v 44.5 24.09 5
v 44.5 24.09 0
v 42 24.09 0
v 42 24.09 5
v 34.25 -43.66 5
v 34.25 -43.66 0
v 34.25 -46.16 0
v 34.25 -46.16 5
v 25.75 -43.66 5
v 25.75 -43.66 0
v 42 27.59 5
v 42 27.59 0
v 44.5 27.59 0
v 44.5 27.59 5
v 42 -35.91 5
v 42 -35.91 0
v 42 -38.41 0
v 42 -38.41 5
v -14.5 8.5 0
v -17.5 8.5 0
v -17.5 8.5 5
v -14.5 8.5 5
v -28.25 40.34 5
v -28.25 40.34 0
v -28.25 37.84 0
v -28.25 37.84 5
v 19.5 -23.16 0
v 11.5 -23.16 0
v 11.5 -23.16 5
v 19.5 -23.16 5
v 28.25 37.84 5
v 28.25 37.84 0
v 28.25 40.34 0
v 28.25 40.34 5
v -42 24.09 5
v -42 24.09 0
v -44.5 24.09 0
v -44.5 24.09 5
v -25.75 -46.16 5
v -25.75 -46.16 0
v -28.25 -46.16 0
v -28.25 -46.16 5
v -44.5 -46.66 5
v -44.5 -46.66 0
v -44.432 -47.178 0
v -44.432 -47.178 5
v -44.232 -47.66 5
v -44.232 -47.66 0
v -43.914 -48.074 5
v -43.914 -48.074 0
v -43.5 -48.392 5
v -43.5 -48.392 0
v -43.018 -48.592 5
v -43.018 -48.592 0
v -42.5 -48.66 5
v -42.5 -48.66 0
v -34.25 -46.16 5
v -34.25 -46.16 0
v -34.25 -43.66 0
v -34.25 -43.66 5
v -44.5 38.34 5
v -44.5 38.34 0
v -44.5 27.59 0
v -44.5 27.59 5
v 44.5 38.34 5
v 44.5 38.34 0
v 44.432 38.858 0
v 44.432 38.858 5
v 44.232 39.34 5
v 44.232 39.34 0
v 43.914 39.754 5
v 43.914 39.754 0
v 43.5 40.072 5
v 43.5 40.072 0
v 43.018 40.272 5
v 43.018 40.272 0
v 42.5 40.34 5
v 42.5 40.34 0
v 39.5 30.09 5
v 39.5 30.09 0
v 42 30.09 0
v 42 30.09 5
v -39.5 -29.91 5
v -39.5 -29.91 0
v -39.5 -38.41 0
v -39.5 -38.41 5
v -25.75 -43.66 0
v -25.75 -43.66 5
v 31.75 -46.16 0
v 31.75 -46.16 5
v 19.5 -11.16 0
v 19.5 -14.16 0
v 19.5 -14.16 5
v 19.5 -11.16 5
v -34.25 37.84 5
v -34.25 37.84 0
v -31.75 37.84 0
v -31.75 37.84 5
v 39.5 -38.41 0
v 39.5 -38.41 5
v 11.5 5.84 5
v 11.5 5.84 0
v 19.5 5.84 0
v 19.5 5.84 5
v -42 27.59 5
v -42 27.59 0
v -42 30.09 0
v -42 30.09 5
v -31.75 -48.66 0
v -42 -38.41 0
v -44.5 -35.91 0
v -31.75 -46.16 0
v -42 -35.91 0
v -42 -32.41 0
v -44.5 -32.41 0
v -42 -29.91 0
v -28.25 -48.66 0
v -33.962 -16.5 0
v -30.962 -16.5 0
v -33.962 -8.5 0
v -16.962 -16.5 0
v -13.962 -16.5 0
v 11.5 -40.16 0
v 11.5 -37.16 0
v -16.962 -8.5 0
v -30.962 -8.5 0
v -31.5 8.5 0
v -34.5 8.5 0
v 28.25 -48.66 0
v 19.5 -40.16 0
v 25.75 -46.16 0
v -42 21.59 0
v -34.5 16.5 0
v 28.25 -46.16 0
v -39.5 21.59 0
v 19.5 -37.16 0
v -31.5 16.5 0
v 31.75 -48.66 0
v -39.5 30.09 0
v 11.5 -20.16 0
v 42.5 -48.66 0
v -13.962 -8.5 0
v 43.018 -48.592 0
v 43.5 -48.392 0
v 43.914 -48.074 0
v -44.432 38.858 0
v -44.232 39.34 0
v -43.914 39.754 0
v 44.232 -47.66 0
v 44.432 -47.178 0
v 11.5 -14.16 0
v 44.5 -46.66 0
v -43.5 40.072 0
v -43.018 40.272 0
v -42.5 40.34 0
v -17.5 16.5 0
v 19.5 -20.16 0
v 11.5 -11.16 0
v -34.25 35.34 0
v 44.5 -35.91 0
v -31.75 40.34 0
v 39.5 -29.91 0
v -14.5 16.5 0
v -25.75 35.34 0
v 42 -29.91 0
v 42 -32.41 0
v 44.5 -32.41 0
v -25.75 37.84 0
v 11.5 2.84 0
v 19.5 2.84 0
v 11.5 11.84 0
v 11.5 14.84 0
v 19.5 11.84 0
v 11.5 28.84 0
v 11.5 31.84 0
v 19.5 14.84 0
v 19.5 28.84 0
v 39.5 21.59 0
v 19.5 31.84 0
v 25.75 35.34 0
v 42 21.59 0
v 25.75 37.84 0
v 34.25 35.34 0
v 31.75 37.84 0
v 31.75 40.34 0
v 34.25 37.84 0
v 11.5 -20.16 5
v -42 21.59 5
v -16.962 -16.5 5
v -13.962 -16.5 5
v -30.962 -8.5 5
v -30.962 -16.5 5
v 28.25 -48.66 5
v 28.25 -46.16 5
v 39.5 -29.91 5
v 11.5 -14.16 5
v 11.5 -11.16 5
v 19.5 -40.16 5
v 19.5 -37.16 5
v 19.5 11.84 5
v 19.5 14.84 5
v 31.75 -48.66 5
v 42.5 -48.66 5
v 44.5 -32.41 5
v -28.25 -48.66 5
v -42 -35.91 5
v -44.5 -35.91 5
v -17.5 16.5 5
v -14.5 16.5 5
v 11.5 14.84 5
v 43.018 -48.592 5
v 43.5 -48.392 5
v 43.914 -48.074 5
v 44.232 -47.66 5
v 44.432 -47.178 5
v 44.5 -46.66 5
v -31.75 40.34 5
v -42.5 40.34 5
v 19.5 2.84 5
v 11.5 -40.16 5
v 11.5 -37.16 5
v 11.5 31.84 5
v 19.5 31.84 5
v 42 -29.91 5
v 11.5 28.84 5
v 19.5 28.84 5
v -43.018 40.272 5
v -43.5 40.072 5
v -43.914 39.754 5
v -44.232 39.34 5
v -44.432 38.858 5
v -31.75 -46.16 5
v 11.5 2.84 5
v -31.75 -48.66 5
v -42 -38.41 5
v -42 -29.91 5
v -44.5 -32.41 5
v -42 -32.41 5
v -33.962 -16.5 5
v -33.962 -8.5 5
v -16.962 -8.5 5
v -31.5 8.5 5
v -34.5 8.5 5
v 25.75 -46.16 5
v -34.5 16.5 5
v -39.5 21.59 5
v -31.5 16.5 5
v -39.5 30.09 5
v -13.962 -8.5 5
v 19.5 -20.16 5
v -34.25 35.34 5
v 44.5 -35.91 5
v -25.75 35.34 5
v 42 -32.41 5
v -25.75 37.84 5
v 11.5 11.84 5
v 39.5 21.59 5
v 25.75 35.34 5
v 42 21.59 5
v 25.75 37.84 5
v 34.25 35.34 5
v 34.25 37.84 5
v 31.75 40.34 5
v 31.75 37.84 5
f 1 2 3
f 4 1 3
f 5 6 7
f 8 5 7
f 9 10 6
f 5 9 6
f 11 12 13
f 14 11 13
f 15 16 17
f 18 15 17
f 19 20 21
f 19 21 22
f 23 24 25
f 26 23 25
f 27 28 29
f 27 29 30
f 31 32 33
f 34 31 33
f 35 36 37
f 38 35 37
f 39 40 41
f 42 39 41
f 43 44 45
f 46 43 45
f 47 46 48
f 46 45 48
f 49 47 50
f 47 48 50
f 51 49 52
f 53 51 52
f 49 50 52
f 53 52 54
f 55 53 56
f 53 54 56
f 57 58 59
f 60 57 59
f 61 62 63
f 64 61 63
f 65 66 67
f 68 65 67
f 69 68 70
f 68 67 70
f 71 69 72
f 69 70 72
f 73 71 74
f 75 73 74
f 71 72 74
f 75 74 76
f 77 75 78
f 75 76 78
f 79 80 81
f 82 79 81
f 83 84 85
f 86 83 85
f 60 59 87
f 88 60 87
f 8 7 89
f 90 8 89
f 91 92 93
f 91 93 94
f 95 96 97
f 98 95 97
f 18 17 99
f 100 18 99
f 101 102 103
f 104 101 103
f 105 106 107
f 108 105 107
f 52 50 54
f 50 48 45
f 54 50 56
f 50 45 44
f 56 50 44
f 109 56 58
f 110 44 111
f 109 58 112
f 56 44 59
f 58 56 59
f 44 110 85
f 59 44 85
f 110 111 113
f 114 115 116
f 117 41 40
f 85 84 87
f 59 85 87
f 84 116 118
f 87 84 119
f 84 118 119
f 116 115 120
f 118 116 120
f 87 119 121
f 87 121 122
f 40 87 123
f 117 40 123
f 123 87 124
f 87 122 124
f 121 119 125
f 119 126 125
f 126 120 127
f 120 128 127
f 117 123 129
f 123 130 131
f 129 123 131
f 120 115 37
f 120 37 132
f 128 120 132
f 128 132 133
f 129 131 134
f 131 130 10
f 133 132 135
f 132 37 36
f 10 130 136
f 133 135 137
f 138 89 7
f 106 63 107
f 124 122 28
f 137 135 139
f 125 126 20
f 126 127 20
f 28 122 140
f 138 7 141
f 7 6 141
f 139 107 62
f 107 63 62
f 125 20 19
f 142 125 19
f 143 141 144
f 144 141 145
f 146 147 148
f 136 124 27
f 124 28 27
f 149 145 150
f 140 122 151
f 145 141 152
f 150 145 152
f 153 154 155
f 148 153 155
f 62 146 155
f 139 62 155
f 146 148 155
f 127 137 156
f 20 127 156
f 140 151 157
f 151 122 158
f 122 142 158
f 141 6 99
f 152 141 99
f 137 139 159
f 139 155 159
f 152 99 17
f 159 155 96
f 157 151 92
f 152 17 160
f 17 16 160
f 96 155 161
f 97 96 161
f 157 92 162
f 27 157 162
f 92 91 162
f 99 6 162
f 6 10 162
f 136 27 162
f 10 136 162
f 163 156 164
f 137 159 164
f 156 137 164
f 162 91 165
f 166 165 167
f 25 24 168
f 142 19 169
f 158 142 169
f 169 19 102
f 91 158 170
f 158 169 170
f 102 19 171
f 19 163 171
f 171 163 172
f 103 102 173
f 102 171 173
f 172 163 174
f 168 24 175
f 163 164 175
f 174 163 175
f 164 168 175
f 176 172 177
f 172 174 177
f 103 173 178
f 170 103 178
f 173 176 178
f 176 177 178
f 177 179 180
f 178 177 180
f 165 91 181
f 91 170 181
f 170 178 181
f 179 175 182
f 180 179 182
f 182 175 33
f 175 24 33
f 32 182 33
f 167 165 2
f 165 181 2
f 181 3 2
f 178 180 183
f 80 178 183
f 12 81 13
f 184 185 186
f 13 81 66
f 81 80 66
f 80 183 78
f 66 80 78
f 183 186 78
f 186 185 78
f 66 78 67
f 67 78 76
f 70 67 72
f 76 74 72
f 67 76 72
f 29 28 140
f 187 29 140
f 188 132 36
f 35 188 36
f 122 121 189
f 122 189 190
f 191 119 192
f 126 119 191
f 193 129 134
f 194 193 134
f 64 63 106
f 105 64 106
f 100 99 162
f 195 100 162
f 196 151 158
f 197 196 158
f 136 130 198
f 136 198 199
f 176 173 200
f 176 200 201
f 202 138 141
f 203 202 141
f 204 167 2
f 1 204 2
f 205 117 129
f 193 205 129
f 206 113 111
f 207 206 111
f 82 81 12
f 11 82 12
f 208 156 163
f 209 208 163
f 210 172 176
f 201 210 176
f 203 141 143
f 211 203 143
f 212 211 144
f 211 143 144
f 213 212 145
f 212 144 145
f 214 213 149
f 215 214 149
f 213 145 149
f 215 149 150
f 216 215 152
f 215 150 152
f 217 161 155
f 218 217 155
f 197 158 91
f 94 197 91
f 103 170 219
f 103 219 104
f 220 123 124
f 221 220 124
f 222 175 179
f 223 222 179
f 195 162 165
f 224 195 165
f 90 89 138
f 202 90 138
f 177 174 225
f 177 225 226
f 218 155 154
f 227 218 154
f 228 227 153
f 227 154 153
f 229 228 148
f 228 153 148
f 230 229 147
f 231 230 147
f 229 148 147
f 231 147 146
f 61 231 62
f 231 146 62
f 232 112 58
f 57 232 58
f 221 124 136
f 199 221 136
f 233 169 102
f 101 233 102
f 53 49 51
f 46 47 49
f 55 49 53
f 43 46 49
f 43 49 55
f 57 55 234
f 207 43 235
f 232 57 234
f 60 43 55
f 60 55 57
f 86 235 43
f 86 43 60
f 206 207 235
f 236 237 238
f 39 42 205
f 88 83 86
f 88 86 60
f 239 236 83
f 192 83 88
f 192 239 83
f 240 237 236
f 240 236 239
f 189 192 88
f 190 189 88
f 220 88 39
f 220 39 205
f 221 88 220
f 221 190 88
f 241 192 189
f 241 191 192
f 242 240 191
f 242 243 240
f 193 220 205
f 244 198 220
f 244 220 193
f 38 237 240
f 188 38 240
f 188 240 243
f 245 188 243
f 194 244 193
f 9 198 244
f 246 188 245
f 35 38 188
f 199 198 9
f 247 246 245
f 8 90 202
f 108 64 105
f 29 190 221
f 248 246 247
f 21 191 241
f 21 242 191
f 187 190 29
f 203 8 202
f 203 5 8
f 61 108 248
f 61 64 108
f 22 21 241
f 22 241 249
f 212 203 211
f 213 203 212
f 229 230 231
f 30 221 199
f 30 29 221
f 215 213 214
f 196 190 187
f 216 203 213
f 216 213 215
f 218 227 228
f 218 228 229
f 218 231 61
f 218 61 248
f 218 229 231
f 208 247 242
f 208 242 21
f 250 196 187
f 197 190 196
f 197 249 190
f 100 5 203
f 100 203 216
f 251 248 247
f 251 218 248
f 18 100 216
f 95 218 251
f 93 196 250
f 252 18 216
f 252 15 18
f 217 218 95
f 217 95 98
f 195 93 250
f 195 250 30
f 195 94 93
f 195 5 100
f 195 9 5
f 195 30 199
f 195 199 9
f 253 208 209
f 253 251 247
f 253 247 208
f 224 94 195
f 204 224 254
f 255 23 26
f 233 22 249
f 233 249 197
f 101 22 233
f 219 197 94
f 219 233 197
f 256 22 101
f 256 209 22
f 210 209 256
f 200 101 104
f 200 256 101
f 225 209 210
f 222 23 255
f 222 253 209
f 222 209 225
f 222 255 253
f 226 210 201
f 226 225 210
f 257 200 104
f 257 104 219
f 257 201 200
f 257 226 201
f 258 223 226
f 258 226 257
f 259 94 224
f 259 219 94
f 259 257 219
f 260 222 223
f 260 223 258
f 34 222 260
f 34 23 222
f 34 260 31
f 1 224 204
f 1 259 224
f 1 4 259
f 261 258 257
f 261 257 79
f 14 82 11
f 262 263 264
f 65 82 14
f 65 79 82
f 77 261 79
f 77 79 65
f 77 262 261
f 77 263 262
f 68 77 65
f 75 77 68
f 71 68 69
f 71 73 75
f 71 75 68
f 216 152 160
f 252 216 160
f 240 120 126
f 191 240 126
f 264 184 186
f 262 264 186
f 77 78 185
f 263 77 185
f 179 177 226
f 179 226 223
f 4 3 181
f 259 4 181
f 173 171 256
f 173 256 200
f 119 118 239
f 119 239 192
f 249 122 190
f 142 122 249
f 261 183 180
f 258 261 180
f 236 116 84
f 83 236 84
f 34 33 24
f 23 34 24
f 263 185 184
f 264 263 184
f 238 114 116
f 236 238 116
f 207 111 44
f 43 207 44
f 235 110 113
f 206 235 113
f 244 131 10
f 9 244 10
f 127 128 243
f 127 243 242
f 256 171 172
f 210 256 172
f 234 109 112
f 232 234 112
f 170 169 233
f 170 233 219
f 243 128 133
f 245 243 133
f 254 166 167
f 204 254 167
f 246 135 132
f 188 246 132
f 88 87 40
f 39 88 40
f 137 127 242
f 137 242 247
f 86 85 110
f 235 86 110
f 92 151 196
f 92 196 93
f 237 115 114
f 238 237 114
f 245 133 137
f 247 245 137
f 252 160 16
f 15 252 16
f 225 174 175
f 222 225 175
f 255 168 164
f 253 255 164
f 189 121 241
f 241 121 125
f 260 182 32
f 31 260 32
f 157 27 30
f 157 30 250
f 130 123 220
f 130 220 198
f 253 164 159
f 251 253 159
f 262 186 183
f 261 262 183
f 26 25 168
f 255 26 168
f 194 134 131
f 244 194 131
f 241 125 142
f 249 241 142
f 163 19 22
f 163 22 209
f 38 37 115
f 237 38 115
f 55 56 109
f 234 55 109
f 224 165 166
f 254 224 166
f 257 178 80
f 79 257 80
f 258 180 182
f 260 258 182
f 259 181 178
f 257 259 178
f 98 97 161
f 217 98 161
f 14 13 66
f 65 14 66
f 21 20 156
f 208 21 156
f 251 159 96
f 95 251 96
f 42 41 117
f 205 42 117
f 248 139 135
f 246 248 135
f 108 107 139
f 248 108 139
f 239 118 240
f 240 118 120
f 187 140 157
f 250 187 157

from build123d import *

# Parameters (mm, degrees)
SKETCH_1_W      = 3
SKETCH_1_H      = 8
SKETCH_1_W_2    = 8
SKETCH_1_H_2    = 3
EXTRUDE_1_DEPTH = 5


with BuildPart() as part:
    # Эскиз1 → Бобышка-Вытянуть1 (new body)
    with BuildSketch(Plane.XY):
        with BuildLine():
            Line((-31.75, 40.340066927), (-42.5, 40.340066927))
            ThreePointArc((-42.5, 40.340066927), (-43.914213562, 39.754280489), (-44.5, 38.340066927))
            Line((-44.5, 38.340066927), (-44.5, 27.590066927))
            Line((-44.5, 27.590066927), (-42, 27.590066927))
            Line((-42, 27.590066927), (-42, 30.090066927))
            Line((-42, 30.090066927), (-39.5, 30.090066927))
            Line((-39.5, 30.090066927), (-39.5, 21.590066927))
            Line((-39.5, 21.590066927), (-42, 21.590066927))
            Line((-42, 21.590066927), (-42, 24.090066927))
            Line((-42, 24.090066927), (-44.5, 24.090066927))
            Line((-44.5, 24.090066927), (-44.5, -32.409933073))
            Line((-44.5, -32.409933073), (-42, -32.409933073))
            Line((-42, -32.409933073), (-42, -29.909933073))
            Line((-42, -29.909933073), (-39.5, -29.909933073))
            Line((-39.5, -29.909933073), (-39.5, -38.409933073))
            Line((-39.5, -38.409933073), (-42, -38.409933073))
            Line((-42, -38.409933073), (-42, -35.909933073))
            Line((-42, -35.909933073), (-44.5, -35.909933073))
            Line((-44.5, -35.909933073), (-44.5, -46.659933073))
            ThreePointArc((-44.5, -46.659933073), (-43.914213562, -48.074146635), (-42.5, -48.659933073))
            Line((-42.5, -48.659933073), (-31.75, -48.659933073))
            Line((-31.75, -48.659933073), (-31.75, -46.159933073))
            Line((-31.75, -46.159933073), (-34.25, -46.159933073))
            Line((-34.25, -46.159933073), (-34.25, -43.659933073))
            Line((-34.25, -43.659933073), (-25.75, -43.659933073))
            Line((-25.75, -43.659933073), (-25.75, -46.159933073))
            Line((-25.75, -46.159933073), (-28.25, -46.159933073))
            Line((-28.25, -46.159933073), (-28.25, -48.659933073))
            Line((-28.25, -48.659933073), (28.25, -48.659933073))
            Line((28.25, -48.659933073), (28.25, -46.159933073))
            Line((28.25, -46.159933073), (25.75, -46.159933073))
            Line((25.75, -46.159933073), (25.75, -43.659933073))
            Line((25.75, -43.659933073), (34.25, -43.659933073))
            Line((34.25, -43.659933073), (34.25, -46.159933073))
            Line((34.25, -46.159933073), (31.75, -46.159933073))
            Line((31.75, -46.159933073), (31.75, -48.659933073))
            Line((31.75, -48.659933073), (42.5, -48.659933073))
            ThreePointArc((42.5, -48.659933073), (43.914213562, -48.074146635), (44.5, -46.659933073))
            Line((44.5, -46.659933073), (44.5, -35.909933073))
            Line((44.5, -35.909933073), (42, -35.909933073))
            Line((42, -35.909933073), (42, -38.409933073))
            Line((42, -38.409933073), (39.5, -38.409933073))
            Line((39.5, -38.409933073), (39.5, -29.909933073))
            Line((39.5, -29.909933073), (42, -29.909933073))
            Line((42, -29.909933073), (42, -32.409933073))
            Line((42, -32.409933073), (44.5, -32.409933073))
            Line((44.5, -32.409933073), (44.5, 24.090066927))
            Line((44.5, 24.090066927), (42, 24.090066927))
            Line((42, 24.090066927), (42, 21.590066927))
            Line((42, 21.590066927), (39.5, 21.590066927))
            Line((39.5, 21.590066927), (39.5, 30.090066927))
            Line((39.5, 30.090066927), (42, 30.090066927))
            Line((42, 30.090066927), (42, 27.590066927))
            Line((42, 27.590066927), (44.5, 27.590066927))
            Line((44.5, 27.590066927), (44.5, 38.340066927))
            ThreePointArc((44.5, 38.340066927), (43.914213562, 39.754280489), (42.5, 40.340066927))
            Line((42.5, 40.340066927), (31.75, 40.340066927))
            Line((31.75, 40.340066927), (31.75, 37.840066927))
            Line((31.75, 37.840066927), (34.25, 37.840066927))
            Line((34.25, 37.840066927), (34.25, 35.340066927))
            Line((34.25, 35.340066927), (25.75, 35.340066927))
            Line((25.75, 35.340066927), (25.75, 37.840066927))
            Line((25.75, 37.840066927), (28.25, 37.840066927))
            Line((28.25, 37.840066927), (28.25, 40.340066927))
            Line((28.25, 40.340066927), (-28.25, 40.340066927))
            Line((-28.25, 40.340066927), (-28.25, 37.840066927))
            Line((-28.25, 37.840066927), (-25.75, 37.840066927))
            Line((-25.75, 37.840066927), (-25.75, 35.340066927))
            Line((-25.75, 35.340066927), (-34.25, 35.340066927))
            Line((-34.25, 35.340066927), (-34.25, 37.840066927))
            Line((-34.25, 37.840066927), (-31.75, 37.840066927))
            Line((-31.75, 37.840066927), (-31.75, 40.340066927))
        make_face()
        with Locations((-33, 12.5)):
            Rectangle(SKETCH_1_W, SKETCH_1_H, mode=Mode.SUBTRACT)
        with Locations((-32.461916363, -12.5)):
            Rectangle(SKETCH_1_W, SKETCH_1_H, mode=Mode.SUBTRACT)
        with Locations((-16, 12.5)):
            Rectangle(SKETCH_1_W, SKETCH_1_H, mode=Mode.SUBTRACT)
        with Locations((-15.461916363, -12.5)):
            Rectangle(SKETCH_1_W, SKETCH_1_H, mode=Mode.SUBTRACT)
        with Locations((15.5, 13.340066927)):
            Rectangle(SKETCH_1_W_2, SKETCH_1_H_2, mode=Mode.SUBTRACT)
        with Locations((15.5, 30.340066927)):
            Rectangle(SKETCH_1_W_2, SKETCH_1_H_2, mode=Mode.SUBTRACT)
        with Locations((15.5, -12.659933073)):
            Rectangle(SKETCH_1_W_2, SKETCH_1_H_2, mode=Mode.SUBTRACT)
        with Locations((15.5, 4.340066927)):
            Rectangle(SKETCH_1_W_2, SKETCH_1_H_2, mode=Mode.SUBTRACT)
        with Locations((15.5, -38.659933073)):
            Rectangle(SKETCH_1_W_2, SKETCH_1_H_2, mode=Mode.SUBTRACT)
        with Locations((15.5, -21.659933073)):
            Rectangle(SKETCH_1_W_2, SKETCH_1_H_2, mode=Mode.SUBTRACT)
    extrude(amount=EXTRUDE_1_DEPTH)


solid = part.part
